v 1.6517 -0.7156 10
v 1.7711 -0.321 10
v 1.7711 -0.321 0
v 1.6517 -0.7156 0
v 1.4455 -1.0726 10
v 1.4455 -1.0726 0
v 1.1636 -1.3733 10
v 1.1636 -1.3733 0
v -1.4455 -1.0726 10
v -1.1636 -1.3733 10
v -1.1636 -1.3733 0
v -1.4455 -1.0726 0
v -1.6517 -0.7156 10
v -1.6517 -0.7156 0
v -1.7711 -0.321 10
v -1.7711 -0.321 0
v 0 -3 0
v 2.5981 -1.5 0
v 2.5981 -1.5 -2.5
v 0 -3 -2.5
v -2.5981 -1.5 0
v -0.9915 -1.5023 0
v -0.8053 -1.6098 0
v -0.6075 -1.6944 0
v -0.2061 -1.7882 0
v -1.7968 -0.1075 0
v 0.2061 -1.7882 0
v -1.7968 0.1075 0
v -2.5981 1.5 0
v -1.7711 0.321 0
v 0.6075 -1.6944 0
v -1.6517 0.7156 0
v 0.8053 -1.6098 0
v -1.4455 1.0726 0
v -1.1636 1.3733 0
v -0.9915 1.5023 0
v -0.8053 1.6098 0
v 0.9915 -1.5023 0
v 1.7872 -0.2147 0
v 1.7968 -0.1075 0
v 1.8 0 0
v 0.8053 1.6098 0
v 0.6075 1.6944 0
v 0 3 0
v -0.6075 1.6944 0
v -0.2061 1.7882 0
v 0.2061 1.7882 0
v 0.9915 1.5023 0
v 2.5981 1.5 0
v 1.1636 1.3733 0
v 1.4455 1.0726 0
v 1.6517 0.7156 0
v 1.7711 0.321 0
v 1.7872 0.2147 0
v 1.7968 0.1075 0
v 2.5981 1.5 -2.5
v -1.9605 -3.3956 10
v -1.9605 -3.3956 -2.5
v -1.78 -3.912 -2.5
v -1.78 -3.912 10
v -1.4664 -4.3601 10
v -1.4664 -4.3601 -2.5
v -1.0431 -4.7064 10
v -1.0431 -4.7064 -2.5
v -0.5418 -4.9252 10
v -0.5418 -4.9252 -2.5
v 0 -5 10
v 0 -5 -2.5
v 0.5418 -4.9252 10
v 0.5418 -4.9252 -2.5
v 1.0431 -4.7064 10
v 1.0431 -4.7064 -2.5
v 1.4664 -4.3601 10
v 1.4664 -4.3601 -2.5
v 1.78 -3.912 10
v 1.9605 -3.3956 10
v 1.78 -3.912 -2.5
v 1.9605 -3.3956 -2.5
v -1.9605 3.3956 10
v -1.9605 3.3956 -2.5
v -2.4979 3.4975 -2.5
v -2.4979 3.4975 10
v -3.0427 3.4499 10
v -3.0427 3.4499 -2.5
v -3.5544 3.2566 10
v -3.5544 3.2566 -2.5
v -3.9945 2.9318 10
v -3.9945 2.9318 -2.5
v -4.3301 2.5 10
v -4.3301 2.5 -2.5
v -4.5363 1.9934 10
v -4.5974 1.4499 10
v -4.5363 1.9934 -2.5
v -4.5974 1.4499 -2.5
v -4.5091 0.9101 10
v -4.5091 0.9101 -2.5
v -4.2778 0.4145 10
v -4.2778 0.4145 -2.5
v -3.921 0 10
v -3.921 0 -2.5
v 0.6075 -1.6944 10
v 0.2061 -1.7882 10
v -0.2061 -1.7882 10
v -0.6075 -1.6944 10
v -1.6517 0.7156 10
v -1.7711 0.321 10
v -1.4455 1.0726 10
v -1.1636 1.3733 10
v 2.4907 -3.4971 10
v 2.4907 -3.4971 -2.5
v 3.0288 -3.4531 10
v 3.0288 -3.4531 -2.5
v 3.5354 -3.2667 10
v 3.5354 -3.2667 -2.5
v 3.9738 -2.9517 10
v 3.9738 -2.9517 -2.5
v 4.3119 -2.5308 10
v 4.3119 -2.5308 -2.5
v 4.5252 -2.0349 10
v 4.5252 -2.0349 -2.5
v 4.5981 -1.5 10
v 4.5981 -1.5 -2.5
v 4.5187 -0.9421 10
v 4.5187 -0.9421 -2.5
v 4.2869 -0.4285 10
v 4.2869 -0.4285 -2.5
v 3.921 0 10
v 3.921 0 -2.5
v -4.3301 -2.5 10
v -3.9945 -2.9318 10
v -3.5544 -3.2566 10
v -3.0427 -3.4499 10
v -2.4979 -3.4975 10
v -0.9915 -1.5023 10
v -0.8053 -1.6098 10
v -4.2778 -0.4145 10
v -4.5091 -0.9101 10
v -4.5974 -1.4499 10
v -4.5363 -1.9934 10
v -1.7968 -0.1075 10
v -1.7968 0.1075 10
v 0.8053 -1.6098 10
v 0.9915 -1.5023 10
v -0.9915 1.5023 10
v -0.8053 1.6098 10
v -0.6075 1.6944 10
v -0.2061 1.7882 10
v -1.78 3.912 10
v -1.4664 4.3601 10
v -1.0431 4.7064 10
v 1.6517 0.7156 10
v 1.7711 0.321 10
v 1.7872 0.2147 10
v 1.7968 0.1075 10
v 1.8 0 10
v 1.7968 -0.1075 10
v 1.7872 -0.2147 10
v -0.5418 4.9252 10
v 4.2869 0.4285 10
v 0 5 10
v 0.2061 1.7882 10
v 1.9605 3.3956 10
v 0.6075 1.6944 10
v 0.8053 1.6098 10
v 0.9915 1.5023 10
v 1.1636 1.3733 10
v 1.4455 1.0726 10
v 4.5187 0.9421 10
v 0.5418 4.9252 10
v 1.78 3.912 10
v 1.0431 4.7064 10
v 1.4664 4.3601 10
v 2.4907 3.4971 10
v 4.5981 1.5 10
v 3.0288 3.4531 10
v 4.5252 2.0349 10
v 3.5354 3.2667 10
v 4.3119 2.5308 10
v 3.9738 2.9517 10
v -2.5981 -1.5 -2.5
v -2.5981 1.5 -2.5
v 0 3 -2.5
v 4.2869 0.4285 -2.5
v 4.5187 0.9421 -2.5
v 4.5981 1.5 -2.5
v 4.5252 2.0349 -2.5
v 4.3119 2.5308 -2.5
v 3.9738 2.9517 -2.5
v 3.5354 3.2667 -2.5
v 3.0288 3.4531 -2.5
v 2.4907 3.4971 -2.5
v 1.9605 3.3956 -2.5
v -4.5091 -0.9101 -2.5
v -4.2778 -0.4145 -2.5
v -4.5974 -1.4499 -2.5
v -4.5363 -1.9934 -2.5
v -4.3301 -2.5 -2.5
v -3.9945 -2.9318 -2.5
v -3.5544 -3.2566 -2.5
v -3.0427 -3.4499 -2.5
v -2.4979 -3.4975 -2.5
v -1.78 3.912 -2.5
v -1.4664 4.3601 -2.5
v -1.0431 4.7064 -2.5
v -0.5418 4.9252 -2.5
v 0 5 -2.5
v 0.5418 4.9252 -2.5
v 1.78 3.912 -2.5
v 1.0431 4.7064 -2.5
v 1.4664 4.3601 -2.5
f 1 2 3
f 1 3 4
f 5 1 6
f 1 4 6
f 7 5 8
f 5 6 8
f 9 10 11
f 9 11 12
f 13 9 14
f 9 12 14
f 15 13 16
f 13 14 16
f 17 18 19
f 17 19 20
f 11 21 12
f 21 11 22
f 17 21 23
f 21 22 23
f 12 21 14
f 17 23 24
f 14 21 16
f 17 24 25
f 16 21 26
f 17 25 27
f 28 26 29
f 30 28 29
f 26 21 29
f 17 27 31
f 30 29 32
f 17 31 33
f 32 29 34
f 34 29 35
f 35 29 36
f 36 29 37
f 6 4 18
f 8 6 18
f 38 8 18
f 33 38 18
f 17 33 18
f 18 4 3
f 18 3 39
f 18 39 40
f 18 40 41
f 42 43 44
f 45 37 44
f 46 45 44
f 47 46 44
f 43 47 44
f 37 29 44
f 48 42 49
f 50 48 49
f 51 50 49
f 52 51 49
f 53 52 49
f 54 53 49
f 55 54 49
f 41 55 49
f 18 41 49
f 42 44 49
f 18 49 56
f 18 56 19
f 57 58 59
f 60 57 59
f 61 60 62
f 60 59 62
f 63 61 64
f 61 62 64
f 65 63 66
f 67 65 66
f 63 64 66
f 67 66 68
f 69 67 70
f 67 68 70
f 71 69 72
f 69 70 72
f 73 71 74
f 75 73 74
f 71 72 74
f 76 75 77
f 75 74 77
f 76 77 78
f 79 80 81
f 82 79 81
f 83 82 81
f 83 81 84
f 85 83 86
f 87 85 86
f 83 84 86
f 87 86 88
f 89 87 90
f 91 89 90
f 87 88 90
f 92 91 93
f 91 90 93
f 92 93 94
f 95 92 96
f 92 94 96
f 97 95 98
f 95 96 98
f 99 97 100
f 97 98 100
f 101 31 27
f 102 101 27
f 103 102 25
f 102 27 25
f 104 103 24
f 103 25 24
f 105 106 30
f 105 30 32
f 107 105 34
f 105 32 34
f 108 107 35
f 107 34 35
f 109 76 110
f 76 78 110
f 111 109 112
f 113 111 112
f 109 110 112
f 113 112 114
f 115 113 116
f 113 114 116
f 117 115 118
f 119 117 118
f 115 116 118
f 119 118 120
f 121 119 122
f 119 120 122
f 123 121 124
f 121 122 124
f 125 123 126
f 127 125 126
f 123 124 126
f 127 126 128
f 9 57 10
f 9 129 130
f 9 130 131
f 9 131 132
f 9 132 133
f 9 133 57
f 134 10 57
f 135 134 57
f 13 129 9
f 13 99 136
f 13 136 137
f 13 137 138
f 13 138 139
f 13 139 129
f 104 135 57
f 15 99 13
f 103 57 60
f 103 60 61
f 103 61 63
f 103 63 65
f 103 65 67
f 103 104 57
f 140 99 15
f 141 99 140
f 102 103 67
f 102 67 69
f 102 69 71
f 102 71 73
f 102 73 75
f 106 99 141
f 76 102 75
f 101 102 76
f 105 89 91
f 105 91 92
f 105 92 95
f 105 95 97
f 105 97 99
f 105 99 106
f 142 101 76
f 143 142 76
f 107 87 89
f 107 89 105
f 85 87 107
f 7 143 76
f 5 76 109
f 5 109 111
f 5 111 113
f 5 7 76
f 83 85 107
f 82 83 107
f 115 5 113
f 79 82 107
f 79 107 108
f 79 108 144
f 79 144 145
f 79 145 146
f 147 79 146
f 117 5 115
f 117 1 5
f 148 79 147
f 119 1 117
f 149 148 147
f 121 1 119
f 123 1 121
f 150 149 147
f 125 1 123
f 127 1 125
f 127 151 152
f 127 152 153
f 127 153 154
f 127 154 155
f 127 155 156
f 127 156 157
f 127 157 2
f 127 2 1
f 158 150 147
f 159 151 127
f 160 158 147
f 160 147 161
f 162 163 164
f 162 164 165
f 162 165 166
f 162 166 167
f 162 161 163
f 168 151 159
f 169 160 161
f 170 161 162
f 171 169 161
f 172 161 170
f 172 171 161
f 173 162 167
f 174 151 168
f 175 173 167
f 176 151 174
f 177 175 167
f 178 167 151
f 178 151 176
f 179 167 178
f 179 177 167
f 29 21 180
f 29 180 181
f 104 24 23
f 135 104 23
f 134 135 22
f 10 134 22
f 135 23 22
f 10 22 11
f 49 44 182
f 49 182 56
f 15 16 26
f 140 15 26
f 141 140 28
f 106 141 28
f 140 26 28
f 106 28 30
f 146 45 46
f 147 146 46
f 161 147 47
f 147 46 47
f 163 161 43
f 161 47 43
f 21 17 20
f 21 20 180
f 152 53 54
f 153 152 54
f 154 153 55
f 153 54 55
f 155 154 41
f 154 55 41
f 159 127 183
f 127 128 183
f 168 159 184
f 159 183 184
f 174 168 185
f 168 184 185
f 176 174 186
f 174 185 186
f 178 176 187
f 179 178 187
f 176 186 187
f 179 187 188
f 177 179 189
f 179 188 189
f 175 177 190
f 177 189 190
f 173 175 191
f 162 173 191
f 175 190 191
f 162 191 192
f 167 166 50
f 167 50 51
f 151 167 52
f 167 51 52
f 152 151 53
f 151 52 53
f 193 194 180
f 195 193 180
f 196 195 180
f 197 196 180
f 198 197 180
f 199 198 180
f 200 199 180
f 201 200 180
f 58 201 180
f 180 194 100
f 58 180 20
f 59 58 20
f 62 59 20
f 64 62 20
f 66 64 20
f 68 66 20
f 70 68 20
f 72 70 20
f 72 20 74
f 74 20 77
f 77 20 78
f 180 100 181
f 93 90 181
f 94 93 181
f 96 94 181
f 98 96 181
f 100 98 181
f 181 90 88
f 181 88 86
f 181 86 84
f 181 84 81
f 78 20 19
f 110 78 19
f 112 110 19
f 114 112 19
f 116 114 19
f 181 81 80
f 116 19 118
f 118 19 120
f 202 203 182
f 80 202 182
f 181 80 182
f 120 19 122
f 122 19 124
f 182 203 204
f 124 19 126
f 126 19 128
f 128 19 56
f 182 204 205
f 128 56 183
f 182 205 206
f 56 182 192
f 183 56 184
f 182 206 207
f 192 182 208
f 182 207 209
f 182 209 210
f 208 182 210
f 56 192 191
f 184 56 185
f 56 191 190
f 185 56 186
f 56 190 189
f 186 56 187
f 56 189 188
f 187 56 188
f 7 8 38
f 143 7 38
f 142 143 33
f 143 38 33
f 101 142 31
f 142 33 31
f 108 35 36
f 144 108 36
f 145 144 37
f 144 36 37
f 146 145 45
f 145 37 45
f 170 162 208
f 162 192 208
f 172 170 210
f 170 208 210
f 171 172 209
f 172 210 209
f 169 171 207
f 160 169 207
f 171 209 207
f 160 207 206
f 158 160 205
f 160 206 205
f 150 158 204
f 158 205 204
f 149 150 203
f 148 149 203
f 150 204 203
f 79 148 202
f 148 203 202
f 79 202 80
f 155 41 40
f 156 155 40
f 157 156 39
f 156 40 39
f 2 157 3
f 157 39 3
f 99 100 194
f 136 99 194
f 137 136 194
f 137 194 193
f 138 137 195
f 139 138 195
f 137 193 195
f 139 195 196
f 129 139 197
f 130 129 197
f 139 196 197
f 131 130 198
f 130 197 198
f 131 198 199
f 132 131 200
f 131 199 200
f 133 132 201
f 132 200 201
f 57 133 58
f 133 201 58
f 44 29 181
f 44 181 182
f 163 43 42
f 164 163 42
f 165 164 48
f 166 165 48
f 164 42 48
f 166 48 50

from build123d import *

# Parameters (mm, degrees)
F1_DEPTH = 2.5
F2_DEPTH = 10


with BuildPart() as f1:
    # F0 (on Top) → F1 (new body)
    with BuildSketch(Plane.XY):
        with BuildLine():
            Line((-0.8660254038, 2.5), (0, 3))
            Line((0, 3), (0.8660254038, 2.5))
            ThreePointArc((0.8660254038, 2.5), (1.3314444273, 3.0477867824), (1.9604759334, 3.3956439237))
            ThreePointArc((1.9604759334, 3.3956439237), (0, 5), (-1.9604759334, 3.3956439237))
            ThreePointArc((-1.9604759334, 3.3956439237), (-1.3314444273, 3.0477867824), (-0.8660254038, 2.5))
        make_face()
        with BuildLine():
            ThreePointArc((1.9604759334, 3.3956439237), (1.3314444273, 3.0477867824), (0.8660254038, 2.5))
            Line((0.8660254038, 2.5), (1.7320508076, 2))
            ThreePointArc((1.7320508076, 2), (1.9318516526, 2.4823619098), (2, 3))
            ThreePointArc((2, 3), (1.9900944534, 3.1988066059), (1.9604759334, 3.3956439237))
        make_face()
        with BuildLine():
            Line((-1.7320508076, 2), (-0.8660254038, 2.5))
            ThreePointArc((-0.8660254038, 2.5), (-1.3314444273, 3.0477867824), (-1.9604759334, 3.3956439237))
            ThreePointArc((-1.9604759334, 3.3956439237), (-1.9737385652, 2.676958089), (-1.7320508076, 2))
        make_face()
        with BuildLine():
            Line((-2.5980762114, 1.5), (-1.7320508076, 2))
            ThreePointArc((-1.7320508076, 2), (-1.9737385652, 2.676958089), (-1.9604759334, 3.3956439237))
            ThreePointArc((-1.9604759334, 3.3956439237), (-4.3301270189, 2.5), (-3.9209518669, 0))
            ThreePointArc((-3.9209518669, 0), (-3.3051829925, 0.3708286934), (-2.5980762114, 0.5))
            Line((-2.5980762114, 0.5), (-2.5980762114, 1.5))
        make_face()
        with BuildLine():
            ThreePointArc((-2.5980762114, 0.5), (-3.3051829925, 0.3708286934), (-3.9209518669, 0))
            ThreePointArc((-3.9209518669, 0), (-3.3051829925, -0.3708286934), (-2.5980762114, -0.5))
            Line((-2.5980762114, -0.5), (-2.5980762114, 0.5))
        make_face()
        with BuildLine():
            ThreePointArc((-2.5980762114, -0.5), (-3.3051829925, -0.3708286934), (-3.9209518669, 0))
            ThreePointArc((-3.9209518669, 0), (-4.3301270189, -2.5), (-1.9604759334, -3.3956439237))
            ThreePointArc((-1.9604759334, -3.3956439237), (-1.9737385652, -2.676958089), (-1.7320508076, -2))
            Line((-1.7320508076, -2), (-2.5980762114, -1.5))
            Line((-2.5980762114, -1.5), (-2.5980762114, -0.5))
        make_face()
        with BuildLine():
            ThreePointArc((-1.7320508076, -2), (-1.9737385652, -2.676958089), (-1.9604759334, -3.3956439237))
            ThreePointArc((-1.9604759334, -3.3956439237), (-1.3314444273, -3.0477867824), (-0.8660254038, -2.5))
            Line((-0.8660254038, -2.5), (-1.7320508076, -2))
        make_face()
        with BuildLine():
            ThreePointArc((-0.8660254038, -2.5), (-1.3314444273, -3.0477867824), (-1.9604759334, -3.3956439237))
            ThreePointArc((-1.9604759334, -3.3956439237), (0, -5), (1.9604759334, -3.3956439237))
            ThreePointArc((1.9604759334, -3.3956439237), (1.3314444273, -3.0477867824), (0.8660254038, -2.5))
            Line((0.8660254038, -2.5), (0, -3))
            Line((0, -3), (-0.8660254038, -2.5))
        make_face()
        with BuildLine():
            ThreePointArc((0.8660254038, -2.5), (1.3314444273, -3.0477867824), (1.9604759334, -3.3956439237))
            ThreePointArc((1.9604759334, -3.3956439237), (1.9900944534, -3.1988066059), (2, -3))
            ThreePointArc((2, -3), (1.9318516526, -2.4823619098), (1.7320508076, -2))
            Line((1.7320508076, -2), (0.8660254038, -2.5))
        make_face()
        with BuildLine():
            ThreePointArc((4.5980762114, -1.5), (4.4209518669, -0.6771243445), (3.9209518669, 0))
            ThreePointArc((3.9209518669, 0), (3.3051829925, -0.3708286934), (2.5980762114, -0.5))
            Line((2.5980762114, -0.5), (2.5980762114, -1.5))
            Line((2.5980762114, -1.5), (1.7320508076, -2))
            ThreePointArc((1.7320508076, -2), (1.9318516526, -2.4823619098), (2, -3))
            ThreePointArc((2, -3), (1.9900944534, -3.1988066059), (1.9604759334, -3.3956439237))
            ThreePointArc((1.9604759334, -3.3956439237), (3.7652950092, -3.1240690496), (4.5980762114, -1.5))
        make_face()
        with BuildLine():
            ThreePointArc((3.9209518669, 0), (3.3051829925, 0.3708286934), (2.5980762114, 0.5))
            Line((2.5980762114, 0.5), (2.5980762114, -0.5))
            ThreePointArc((2.5980762114, -0.5), (3.3051829925, -0.3708286934), (3.9209518669, 0))
        make_face()
        with BuildLine():
            ThreePointArc((2, 3), (1.9318516526, 2.4823619098), (1.7320508076, 2))
            Line((1.7320508076, 2), (2.5980762114, 1.5))
            Line((2.5980762114, 1.5), (2.5980762114, 0.5))
            ThreePointArc((2.5980762114, 0.5), (3.3051829925, 0.3708286934), (3.9209518669, 0))
            ThreePointArc((3.9209518669, 0), (4.4209518669, 0.6771243445), (4.5980762114, 1.5))
            ThreePointArc((4.5980762114, 1.5), (3.7652950092, 3.1240690496), (1.9604759334, 3.3956439237))
            ThreePointArc((1.9604759334, 3.3956439237), (1.9900944534, 3.1988066059), (2, 3))
        make_face()
    extrude(amount=-F1_DEPTH)

    # F0 (on Top) → F2 (join)
    with BuildSketch(Plane.XY):
        with BuildLine():
            ThreePointArc((-0.8660254038, -2.5), (-1.3314444273, -3.0477867824), (-1.9604759334, -3.3956439237))
            ThreePointArc((-1.9604759334, -3.3956439237), (0, -5), (1.9604759334, -3.3956439237))
            ThreePointArc((1.9604759334, -3.3956439237), (1.3314444273, -3.0477867824), (0.8660254038, -2.5))
            Line((0.8660254038, -2.5), (0, -3))
            Line((0, -3), (-0.8660254038, -2.5))
        make_face()
        with BuildLine():
            ThreePointArc((-1.7320508076, -2), (-1.9737385652, -2.676958089), (-1.9604759334, -3.3956439237))
            ThreePointArc((-1.9604759334, -3.3956439237), (-1.3314444273, -3.0477867824), (-0.8660254038, -2.5))
            Line((-0.8660254038, -2.5), (-1.7320508076, -2))
        make_face()
        with BuildLine():
            ThreePointArc((0.8660254038, -2.5), (1.3314444273, -3.0477867824), (1.9604759334, -3.3956439237))
            ThreePointArc((1.9604759334, -3.3956439237), (1.9900944534, -3.1988066059), (2, -3))
            ThreePointArc((2, -3), (1.9318516526, -2.4823619098), (1.7320508076, -2))
            Line((1.7320508076, -2), (0.8660254038, -2.5))
        make_face()
        with BuildLine():
            ThreePointArc((4.5980762114, -1.5), (4.4209518669, -0.6771243445), (3.9209518669, 0))
            ThreePointArc((3.9209518669, 0), (3.3051829925, -0.3708286934), (2.5980762114, -0.5))
            Line((2.5980762114, -0.5), (2.5980762114, -1.5))
            Line((2.5980762114, -1.5), (1.7320508076, -2))
            ThreePointArc((1.7320508076, -2), (1.9318516526, -2.4823619098), (2, -3))
            ThreePointArc((2, -3), (1.9900944534, -3.1988066059), (1.9604759334, -3.3956439237))
            ThreePointArc((1.9604759334, -3.3956439237), (3.7652950092, -3.1240690496), (4.5980762114, -1.5))
        make_face()
        with BuildLine():
            ThreePointArc((1.7320508076, -2), (1.4813407194, -1.6562627961), (1.1635959589, -1.3733333333))
            ThreePointArc((1.1635959589, -1.3733333333), (0.9, -1.5588457268), (0.6075435751, -1.6943703268))
            ThreePointArc((0.6075435751, -1.6943703268), (0.6936952971, -2.1110100927), (0.8660254038, -2.5))
            Line((0.8660254038, -2.5), (1.7320508076, -2))
        make_face()
        with BuildLine():
            ThreePointArc((-0.6075435751, -1.6943703268), (-0.6936952971, -2.1110100927), (-0.8660254038, -2.5))
            Line((-0.8660254038, -2.5), (0, -3))
            Line((0, -3), (0.8660254038, -2.5))
            ThreePointArc((0.8660254038, -2.5), (0.6936952971, -2.1110100927), (0.6075435751, -1.6943703268))
            ThreePointArc((0.6075435751, -1.6943703268), (0, -1.8), (-0.6075435751, -1.6943703268))
        make_face()
        with BuildLine():
            Line((2.5980762114, -1.5), (2.5980762114, -0.5))
            ThreePointArc((2.5980762114, -0.5), (2.1750360164, -0.4547472966), (1.771139534, -0.3210369935))
            ThreePointArc((1.771139534, -0.3210369935), (1.5588457268, -0.9), (1.1635959589, -1.3733333333))
            ThreePointArc((1.1635959589, -1.3733333333), (1.4813407194, -1.6562627961), (1.7320508076, -2))
            Line((1.7320508076, -2), (2.5980762114, -1.5))
        make_face()
        with BuildLine():
            ThreePointArc((-1.1635959589, -1.3733333333), (-1.4813407194, -1.6562627961), (-1.7320508076, -2))
            Line((-1.7320508076, -2), (-0.8660254038, -2.5))
            ThreePointArc((-0.8660254038, -2.5), (-0.6936952971, -2.1110100927), (-0.6075435751, -1.6943703268))
            ThreePointArc((-0.6075435751, -1.6943703268), (-0.9, -1.5588457268), (-1.1635959589, -1.3733333333))
        make_face()
        with BuildLine():
            ThreePointArc((-2.5980762114, -0.5), (-3.3051829925, -0.3708286934), (-3.9209518669, 0))
            ThreePointArc((-3.9209518669, 0), (-4.3301270189, -2.5), (-1.9604759334, -3.3956439237))
            ThreePointArc((-1.9604759334, -3.3956439237), (-1.9737385652, -2.676958089), (-1.7320508076, -2))
            Line((-1.7320508076, -2), (-2.5980762114, -1.5))
            Line((-2.5980762114, -1.5), (-2.5980762114, -0.5))
        make_face()
        with BuildLine():
            ThreePointArc((-1.771139534, -0.3210369935), (-2.1750360164, -0.4547472966), (-2.5980762114, -0.5))
            Line((-2.5980762114, -0.5), (-2.5980762114, -1.5))
            Line((-2.5980762114, -1.5), (-1.7320508076, -2))
            ThreePointArc((-1.7320508076, -2), (-1.4813407194, -1.6562627961), (-1.1635959589, -1.3733333333))
            ThreePointArc((-1.1635959589, -1.3733333333), (-1.5588457268, -0.9), (-1.771139534, -0.3210369935))
        make_face()
        with BuildLine():
            ThreePointArc((3.9209518669, 0), (3.3051829925, 0.3708286934), (2.5980762114, 0.5))
            Line((2.5980762114, 0.5), (2.5980762114, -0.5))
            ThreePointArc((2.5980762114, -0.5), (3.3051829925, -0.3708286934), (3.9209518669, 0))
        make_face()
        with BuildLine():
            ThreePointArc((2, 3), (1.9318516526, 2.4823619098), (1.7320508076, 2))
            Line((1.7320508076, 2), (2.5980762114, 1.5))
            Line((2.5980762114, 1.5), (2.5980762114, 0.5))
            ThreePointArc((2.5980762114, 0.5), (3.3051829925, 0.3708286934), (3.9209518669, 0))
            ThreePointArc((3.9209518669, 0), (4.4209518669, 0.6771243445), (4.5980762114, 1.5))
            ThreePointArc((4.5980762114, 1.5), (3.7652950092, 3.1240690496), (1.9604759334, 3.3956439237))
            ThreePointArc((1.9604759334, 3.3956439237), (1.9900944534, 3.1988066059), (2, 3))
        make_face()
        with BuildLine():
            ThreePointArc((1.9604759334, 3.3956439237), (1.3314444273, 3.0477867824), (0.8660254038, 2.5))
            Line((0.8660254038, 2.5), (1.7320508076, 2))
            ThreePointArc((1.7320508076, 2), (1.9318516526, 2.4823619098), (2, 3))
            ThreePointArc((2, 3), (1.9900944534, 3.1988066059), (1.9604759334, 3.3956439237))
        make_face()
        with BuildLine():
            Line((2.5980762114, -0.5), (2.5980762114, 0.5))
            ThreePointArc((2.5980762114, 0.5), (2.1750360164, 0.4547472966), (1.771139534, 0.3210369935))
            ThreePointArc((1.771139534, 0.3210369935), (1.7927703647, 0.1611658134), (1.8, 0))
            ThreePointArc((1.8, 0), (1.7927703647, -0.1611658134), (1.771139534, -0.3210369935))
            ThreePointArc((1.771139534, -0.3210369935), (2.1750360164, -0.4547472966), (2.5980762114, -0.5))
        make_face()
        with BuildLine():
            Line((2.5980762114, 1.5), (1.7320508076, 2))
            ThreePointArc((1.7320508076, 2), (1.4813407194, 1.6562627961), (1.1635959589, 1.3733333333))
            ThreePointArc((1.1635959589, 1.3733333333), (1.5588457268, 0.9), (1.771139534, 0.3210369935))
            ThreePointArc((1.771139534, 0.3210369935), (2.1750360164, 0.4547472966), (2.5980762114, 0.5))
            Line((2.5980762114, 0.5), (2.5980762114, 1.5))
        make_face()
        with BuildLine():
            Line((1.7320508076, 2), (0.8660254038, 2.5))
            ThreePointArc((0.8660254038, 2.5), (0.6936952971, 2.1110100927), (0.6075435751, 1.6943703268))
            ThreePointArc((0.6075435751, 1.6943703268), (0.9, 1.5588457268), (1.1635959589, 1.3733333333))
            ThreePointArc((1.1635959589, 1.3733333333), (1.4813407194, 1.6562627961), (1.7320508076, 2))
        make_face()
        with BuildLine():
            ThreePointArc((-2.5980762114, 0.5), (-3.3051829925, 0.3708286934), (-3.9209518669, 0))
            ThreePointArc((-3.9209518669, 0), (-3.3051829925, -0.3708286934), (-2.5980762114, -0.5))
            Line((-2.5980762114, -0.5), (-2.5980762114, 0.5))
        make_face()
        with BuildLine():
            Line((-2.5980762114, 1.5), (-1.7320508076, 2))
            ThreePointArc((-1.7320508076, 2), (-1.9737385652, 2.676958089), (-1.9604759334, 3.3956439237))
            ThreePointArc((-1.9604759334, 3.3956439237), (-4.3301270189, 2.5), (-3.9209518669, 0))
            ThreePointArc((-3.9209518669, 0), (-3.3051829925, 0.3708286934), (-2.5980762114, 0.5))
            Line((-2.5980762114, 0.5), (-2.5980762114, 1.5))
        make_face()
        with BuildLine():
            ThreePointArc((-1.771139534, 0.3210369935), (-2.1750360164, 0.4547472966), (-2.5980762114, 0.5))
            Line((-2.5980762114, 0.5), (-2.5980762114, -0.5))
            ThreePointArc((-2.5980762114, -0.5), (-2.1750360164, -0.4547472966), (-1.771139534, -0.3210369935))
            ThreePointArc((-1.771139534, -0.3210369935), (-1.8, 0), (-1.771139534, 0.3210369935))
        make_face()
        with BuildLine():
            ThreePointArc((-1.1635959589, 1.3733333333), (-1.4813407194, 1.6562627961), (-1.7320508076, 2))
            Line((-1.7320508076, 2), (-2.5980762114, 1.5))
            Line((-2.5980762114, 1.5), (-2.5980762114, 0.5))
            ThreePointArc((-2.5980762114, 0.5), (-2.1750360164, 0.4547472966), (-1.771139534, 0.3210369935))
            ThreePointArc((-1.771139534, 0.3210369935), (-1.5588457268, 0.9), (-1.1635959589, 1.3733333333))
        make_face()
        with BuildLine():
            Line((-1.7320508076, 2), (-0.8660254038, 2.5))
            ThreePointArc((-0.8660254038, 2.5), (-1.3314444273, 3.0477867824), (-1.9604759334, 3.3956439237))
            ThreePointArc((-1.9604759334, 3.3956439237), (-1.9737385652, 2.676958089), (-1.7320508076, 2))
        make_face()
        with BuildLine():
            Line((-0.8660254038, 2.5), (0, 3))
            Line((0, 3), (0.8660254038, 2.5))
            ThreePointArc((0.8660254038, 2.5), (1.3314444273, 3.0477867824), (1.9604759334, 3.3956439237))
            ThreePointArc((1.9604759334, 3.3956439237), (0, 5), (-1.9604759334, 3.3956439237))
            ThreePointArc((-1.9604759334, 3.3956439237), (-1.3314444273, 3.0477867824), (-0.8660254038, 2.5))
        make_face()
        with BuildLine():
            ThreePointArc((-0.6075435751, 1.6943703268), (-0.6936952971, 2.1110100927), (-0.8660254038, 2.5))
            Line((-0.8660254038, 2.5), (-1.7320508076, 2))
            ThreePointArc((-1.7320508076, 2), (-1.4813407194, 1.6562627961), (-1.1635959589, 1.3733333333))
            ThreePointArc((-1.1635959589, 1.3733333333), (-0.9, 1.5588457268), (-0.6075435751, 1.6943703268))
        make_face()
        with BuildLine():
            Line((0.8660254038, 2.5), (0, 3))
            Line((0, 3), (-0.8660254038, 2.5))
            ThreePointArc((-0.8660254038, 2.5), (-0.6936952971, 2.1110100927), (-0.6075435751, 1.6943703268))
            ThreePointArc((-0.6075435751, 1.6943703268), (0, 1.8), (0.6075435751, 1.6943703268))
            ThreePointArc((0.6075435751, 1.6943703268), (0.6936952971, 2.1110100927), (0.8660254038, 2.5))
        make_face()
    extrude(amount=F2_DEPTH)


solid = f1.part
